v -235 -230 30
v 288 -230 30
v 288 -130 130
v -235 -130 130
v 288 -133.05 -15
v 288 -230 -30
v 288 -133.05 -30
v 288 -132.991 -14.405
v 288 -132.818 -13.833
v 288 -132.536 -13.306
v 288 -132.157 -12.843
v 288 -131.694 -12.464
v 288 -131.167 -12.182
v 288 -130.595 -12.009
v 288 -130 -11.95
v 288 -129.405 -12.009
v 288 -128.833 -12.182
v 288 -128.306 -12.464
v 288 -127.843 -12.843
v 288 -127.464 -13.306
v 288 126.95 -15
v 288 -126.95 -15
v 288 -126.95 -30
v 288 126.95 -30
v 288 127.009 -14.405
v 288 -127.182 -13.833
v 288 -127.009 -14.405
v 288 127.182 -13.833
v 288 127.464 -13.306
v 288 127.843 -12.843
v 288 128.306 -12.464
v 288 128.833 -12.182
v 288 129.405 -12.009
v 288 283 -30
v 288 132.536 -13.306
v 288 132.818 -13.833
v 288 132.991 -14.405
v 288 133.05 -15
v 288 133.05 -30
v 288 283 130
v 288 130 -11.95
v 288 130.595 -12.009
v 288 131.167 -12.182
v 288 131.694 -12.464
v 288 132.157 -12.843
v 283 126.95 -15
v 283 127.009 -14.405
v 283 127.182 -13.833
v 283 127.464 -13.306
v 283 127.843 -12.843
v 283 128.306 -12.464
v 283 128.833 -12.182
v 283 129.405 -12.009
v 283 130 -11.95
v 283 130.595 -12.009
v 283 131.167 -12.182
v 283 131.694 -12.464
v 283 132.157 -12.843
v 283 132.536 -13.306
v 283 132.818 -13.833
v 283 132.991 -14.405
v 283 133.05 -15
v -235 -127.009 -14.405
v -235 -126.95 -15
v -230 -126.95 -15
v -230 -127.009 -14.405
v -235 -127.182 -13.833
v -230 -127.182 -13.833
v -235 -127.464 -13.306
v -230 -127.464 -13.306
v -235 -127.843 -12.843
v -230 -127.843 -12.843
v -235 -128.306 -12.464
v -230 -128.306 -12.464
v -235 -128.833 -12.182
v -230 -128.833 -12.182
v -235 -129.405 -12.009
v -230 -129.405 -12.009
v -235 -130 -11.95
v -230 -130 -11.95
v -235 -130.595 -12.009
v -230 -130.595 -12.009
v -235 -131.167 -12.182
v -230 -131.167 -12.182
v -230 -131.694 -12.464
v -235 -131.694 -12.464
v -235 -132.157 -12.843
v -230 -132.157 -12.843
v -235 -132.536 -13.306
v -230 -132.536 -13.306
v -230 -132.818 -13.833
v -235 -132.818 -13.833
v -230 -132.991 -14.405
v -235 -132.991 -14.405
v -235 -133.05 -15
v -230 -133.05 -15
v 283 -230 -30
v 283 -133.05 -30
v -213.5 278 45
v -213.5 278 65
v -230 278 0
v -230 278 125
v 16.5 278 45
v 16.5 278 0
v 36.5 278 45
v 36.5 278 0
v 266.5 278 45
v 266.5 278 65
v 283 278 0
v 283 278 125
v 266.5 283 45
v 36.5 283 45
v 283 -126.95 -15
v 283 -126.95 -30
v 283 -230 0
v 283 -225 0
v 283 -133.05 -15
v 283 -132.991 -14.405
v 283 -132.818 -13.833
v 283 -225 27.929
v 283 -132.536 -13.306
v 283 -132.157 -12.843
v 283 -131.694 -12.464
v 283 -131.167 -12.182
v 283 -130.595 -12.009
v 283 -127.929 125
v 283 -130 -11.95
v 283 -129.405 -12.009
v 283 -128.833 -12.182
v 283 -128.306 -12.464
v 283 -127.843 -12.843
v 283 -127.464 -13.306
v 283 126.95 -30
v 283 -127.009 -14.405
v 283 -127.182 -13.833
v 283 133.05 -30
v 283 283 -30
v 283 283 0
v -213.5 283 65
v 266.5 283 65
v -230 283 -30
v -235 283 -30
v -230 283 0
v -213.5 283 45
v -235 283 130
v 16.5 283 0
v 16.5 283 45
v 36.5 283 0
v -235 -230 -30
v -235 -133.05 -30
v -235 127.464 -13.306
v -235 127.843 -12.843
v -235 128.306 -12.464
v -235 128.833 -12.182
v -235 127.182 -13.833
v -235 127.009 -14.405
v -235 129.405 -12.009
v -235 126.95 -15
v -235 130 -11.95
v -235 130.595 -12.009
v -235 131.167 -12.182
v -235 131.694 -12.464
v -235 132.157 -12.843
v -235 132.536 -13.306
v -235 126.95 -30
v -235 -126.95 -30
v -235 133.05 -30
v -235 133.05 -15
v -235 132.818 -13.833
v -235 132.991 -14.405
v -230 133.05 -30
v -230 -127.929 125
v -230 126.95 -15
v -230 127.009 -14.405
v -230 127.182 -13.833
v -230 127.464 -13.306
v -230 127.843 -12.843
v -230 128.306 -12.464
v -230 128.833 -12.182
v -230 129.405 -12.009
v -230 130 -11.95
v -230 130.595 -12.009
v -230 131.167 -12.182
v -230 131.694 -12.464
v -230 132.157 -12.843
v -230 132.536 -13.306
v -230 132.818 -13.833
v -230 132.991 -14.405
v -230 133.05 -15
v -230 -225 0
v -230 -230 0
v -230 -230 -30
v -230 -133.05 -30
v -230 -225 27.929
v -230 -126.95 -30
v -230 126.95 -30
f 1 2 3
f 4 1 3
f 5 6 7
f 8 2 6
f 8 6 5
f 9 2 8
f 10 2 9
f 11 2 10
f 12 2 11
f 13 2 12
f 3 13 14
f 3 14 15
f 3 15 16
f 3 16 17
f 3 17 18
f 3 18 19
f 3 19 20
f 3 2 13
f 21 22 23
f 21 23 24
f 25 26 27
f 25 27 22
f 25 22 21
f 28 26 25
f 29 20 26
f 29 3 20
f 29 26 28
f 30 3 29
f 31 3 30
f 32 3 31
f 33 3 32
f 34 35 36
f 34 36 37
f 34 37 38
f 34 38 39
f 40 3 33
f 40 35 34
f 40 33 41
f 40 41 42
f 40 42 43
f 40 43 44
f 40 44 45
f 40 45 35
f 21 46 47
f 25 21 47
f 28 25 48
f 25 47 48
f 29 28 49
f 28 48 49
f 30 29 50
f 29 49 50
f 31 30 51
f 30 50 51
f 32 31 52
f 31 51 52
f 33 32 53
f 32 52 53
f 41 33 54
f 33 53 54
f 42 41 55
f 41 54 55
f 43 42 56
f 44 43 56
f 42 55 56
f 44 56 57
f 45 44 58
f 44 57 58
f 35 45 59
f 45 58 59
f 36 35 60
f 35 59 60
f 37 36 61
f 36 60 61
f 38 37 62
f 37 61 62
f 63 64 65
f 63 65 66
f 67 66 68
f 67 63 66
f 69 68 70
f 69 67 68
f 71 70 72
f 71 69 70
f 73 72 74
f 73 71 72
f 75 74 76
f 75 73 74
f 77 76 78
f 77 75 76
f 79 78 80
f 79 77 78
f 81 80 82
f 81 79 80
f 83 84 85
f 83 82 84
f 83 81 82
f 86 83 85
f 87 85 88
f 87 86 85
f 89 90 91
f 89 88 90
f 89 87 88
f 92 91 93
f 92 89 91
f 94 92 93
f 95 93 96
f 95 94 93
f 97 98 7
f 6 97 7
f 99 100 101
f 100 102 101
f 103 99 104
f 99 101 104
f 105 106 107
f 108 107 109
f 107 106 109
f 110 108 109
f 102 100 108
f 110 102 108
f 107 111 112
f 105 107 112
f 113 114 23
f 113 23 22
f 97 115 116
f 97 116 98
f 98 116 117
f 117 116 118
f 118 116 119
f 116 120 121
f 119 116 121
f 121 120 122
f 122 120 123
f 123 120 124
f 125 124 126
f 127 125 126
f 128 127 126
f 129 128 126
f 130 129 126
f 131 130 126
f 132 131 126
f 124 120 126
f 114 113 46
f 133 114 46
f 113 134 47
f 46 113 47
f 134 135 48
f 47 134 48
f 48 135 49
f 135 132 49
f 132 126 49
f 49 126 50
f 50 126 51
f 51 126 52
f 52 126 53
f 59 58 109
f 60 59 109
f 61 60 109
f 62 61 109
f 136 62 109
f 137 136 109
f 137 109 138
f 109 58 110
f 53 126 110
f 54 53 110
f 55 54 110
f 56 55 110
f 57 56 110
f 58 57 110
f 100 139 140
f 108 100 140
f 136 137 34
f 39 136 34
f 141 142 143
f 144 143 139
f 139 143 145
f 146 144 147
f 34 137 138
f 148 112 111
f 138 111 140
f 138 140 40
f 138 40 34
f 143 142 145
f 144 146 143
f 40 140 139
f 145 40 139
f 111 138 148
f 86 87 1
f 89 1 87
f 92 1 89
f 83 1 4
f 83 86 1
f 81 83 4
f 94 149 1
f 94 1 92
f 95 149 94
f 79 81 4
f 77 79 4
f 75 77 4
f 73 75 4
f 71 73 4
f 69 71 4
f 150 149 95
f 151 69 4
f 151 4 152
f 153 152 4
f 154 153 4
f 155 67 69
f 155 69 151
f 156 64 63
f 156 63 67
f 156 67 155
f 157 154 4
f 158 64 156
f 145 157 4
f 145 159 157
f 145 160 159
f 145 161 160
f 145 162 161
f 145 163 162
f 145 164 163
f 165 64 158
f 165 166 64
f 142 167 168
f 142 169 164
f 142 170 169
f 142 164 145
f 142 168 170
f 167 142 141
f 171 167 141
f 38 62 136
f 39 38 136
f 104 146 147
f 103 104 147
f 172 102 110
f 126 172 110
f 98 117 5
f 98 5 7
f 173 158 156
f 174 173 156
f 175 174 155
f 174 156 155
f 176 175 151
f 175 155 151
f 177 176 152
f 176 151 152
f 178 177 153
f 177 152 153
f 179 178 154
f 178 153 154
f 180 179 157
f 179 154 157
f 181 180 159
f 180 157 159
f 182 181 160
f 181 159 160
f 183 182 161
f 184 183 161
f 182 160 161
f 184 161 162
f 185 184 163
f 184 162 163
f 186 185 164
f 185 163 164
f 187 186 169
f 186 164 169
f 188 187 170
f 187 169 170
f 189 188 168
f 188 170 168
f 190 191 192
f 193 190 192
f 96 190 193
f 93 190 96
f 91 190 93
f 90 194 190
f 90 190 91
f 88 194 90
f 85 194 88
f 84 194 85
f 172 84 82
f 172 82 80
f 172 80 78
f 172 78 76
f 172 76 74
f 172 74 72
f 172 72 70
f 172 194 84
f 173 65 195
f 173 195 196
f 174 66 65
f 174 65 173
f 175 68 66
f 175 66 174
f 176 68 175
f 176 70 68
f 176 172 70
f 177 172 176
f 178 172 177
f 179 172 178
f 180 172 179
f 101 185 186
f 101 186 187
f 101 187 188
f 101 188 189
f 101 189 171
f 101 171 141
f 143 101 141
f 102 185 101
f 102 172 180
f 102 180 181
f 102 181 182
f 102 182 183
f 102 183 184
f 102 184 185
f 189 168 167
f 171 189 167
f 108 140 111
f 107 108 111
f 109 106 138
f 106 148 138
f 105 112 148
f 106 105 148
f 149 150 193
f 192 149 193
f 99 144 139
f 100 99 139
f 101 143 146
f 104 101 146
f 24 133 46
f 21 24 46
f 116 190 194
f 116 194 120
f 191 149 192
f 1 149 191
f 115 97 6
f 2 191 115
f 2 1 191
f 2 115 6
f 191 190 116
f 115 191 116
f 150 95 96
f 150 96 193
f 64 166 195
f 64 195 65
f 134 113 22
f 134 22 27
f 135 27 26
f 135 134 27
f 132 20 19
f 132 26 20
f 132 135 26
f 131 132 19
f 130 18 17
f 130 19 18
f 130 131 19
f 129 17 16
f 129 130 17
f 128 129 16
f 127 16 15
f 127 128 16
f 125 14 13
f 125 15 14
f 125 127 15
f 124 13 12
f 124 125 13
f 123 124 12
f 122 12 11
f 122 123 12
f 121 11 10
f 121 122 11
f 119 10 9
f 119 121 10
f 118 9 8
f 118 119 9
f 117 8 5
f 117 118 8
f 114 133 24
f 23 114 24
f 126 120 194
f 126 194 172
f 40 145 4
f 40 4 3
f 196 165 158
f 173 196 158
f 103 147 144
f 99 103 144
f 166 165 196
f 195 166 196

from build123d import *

# Parameters (mm, degrees)
SCHIZZO2_W                   = 523
SCHIZZO2_H                   = 513
ESTRUSIONE_ESTRUSIONE2_DEPTH = 130
SVUOTA1_T                    = -5
TAGLIO_ESTRUSIONE2_REACH     = 610.702
ESTRUSIONE_ESTRUSIONE3_DEPTH = 523
TAGLIO_ESTRUSIONE3_DEPTH     = 10
SCHIZZO5_W                   = 5
SCHIZZO5_H                   = 513
ESTRUSIONE_ESTRUSIONE5_DEPTH = 30
TAGLIO_ESTRUSIONE4_REACH     = 610.702


with BuildPart() as part:
    # Schizzo2 → Estrusione-Estrusione2 (new body)
    with BuildSketch(Plane.XY):
        with Locations((26.5, 26.5)):
            Rectangle(SCHIZZO2_W, SCHIZZO2_H)
    extrude(amount=ESTRUSIONE_ESTRUSIONE2_DEPTH)

    # Svuota1
    svuota1_openings = [part.faces().sort_by_distance(p)[0] for p in [
        (26.5, 26.5, 0),
    ]]
    offset(amount=SVUOTA1_T, openings=svuota1_openings, kind=Kind.INTERSECTION)

    # Taglio-Estrusione2: up to this face of the body (flat: up to its plane)
    taglio_estrusione2_end = Plane(part.part.faces().sort_by_distance((-235, 26.5, 65))[0])
    # Schizzo3 → Taglio-Estrusione2 (cut, up to the picked face)
    with BuildSketch(Plane(origin=(288, 0, 0), x_dir=(0, 0, -1), z_dir=(1, 0, 0)), mode=Mode.PRIVATE) as taglio_estrusione2_sk1:
        Polygon((-30, -230), (-130, -130), (-130, -230), align=None)
    taglio_estrusione2_tool1 = split(extrude(taglio_estrusione2_sk1.sketch, amount=-TAGLIO_ESTRUSIONE2_REACH, mode=Mode.PRIVATE), bisect_by=taglio_estrusione2_end, keep=Keep.BOTH, mode=Mode.PRIVATE)
    add(taglio_estrusione2_tool1.solids().sort_by(Axis((288, -196.666667, 96.666667), (-1, 0, 0)))[0], mode=Mode.SUBTRACT)

    # Schizzo3<4> → Estrusione-Estrusione3 (add)
    with BuildSketch(Plane(origin=(288, 0, 0), x_dir=(0, 0, -1), z_dir=(1, 0, 0))):
        Polygon((-130, -122.928932188), (-130, -130), (-30, -230), (-22.928932188, -230), align=None)
    extrude(amount=-ESTRUSIONE_ESTRUSIONE3_DEPTH)

    # Schizzo4 → Taglio-Estrusione3 (cut)
    with BuildSketch(Plane(origin=(0, 283, 0), x_dir=(1, 0, 0), z_dir=(0, 1, 0))):
        Polygon((-213.5, -65), (266.5, -65), (266.5, -45), (36.5, -45), (36.5, 0), (16.5, 0), (16.5, -45), (-213.5, -45), align=None)
    extrude(amount=-TAGLIO_ESTRUSIONE3_DEPTH, mode=Mode.SUBTRACT)

    # Schizzo5 → Estrusione-Estrusione5 (add)
    with BuildSketch(Plane.XY):
        with Locations((285.5, 26.5)):
            Rectangle(SCHIZZO5_W, SCHIZZO5_H)
        with Locations((-232.5, 26.5)):
            Rectangle(SCHIZZO5_W, SCHIZZO5_H)
    extrude(amount=-ESTRUSIONE_ESTRUSIONE5_DEPTH)

    # Taglio-Estrusione4: up to this face of the body (flat: up to its plane)
    taglio_estrusione4_end = Plane(part.part.faces().sort_by_distance((288, 40.976301678, 46.972842069))[0])
    # Schizzo6 → Taglio-Estrusione4 (cut, up to the picked face)
    with BuildSketch(Plane.ZY.offset(235), mode=Mode.PRIVATE) as taglio_estrusione4_sk1:
        with BuildLine():
            Line((-15, 133.05), (-30, 133.05))
            Line((-30, 133.05), (-30, 126.95))
            Line((-30, 126.95), (-15, 126.95))
            ThreePointArc((-15, 126.95), (-11.95, 130), (-15, 133.05))
        make_face()
    taglio_estrusione4_tool1 = split(extrude(taglio_estrusione4_sk1.sketch, amount=-TAGLIO_ESTRUSIONE4_REACH, mode=Mode.PRIVATE), bisect_by=taglio_estrusione4_end, keep=Keep.BOTH, mode=Mode.PRIVATE)
    # Schizzo6 → Taglio-Estrusione4 (cut, up to the picked face)
    with BuildSketch(Plane.ZY.offset(235), mode=Mode.PRIVATE) as taglio_estrusione4_sk2:
        with BuildLine():
            Line((-30, -133.05), (-30, -126.95))
            Line((-30, -126.95), (-15, -126.95))
            ThreePointArc((-15, -126.95), (-11.95, -130), (-15, -133.05))
            Line((-15, -133.05), (-30, -133.05))
        make_face()
    taglio_estrusione4_tool2 = split(extrude(taglio_estrusione4_sk2.sketch, amount=-TAGLIO_ESTRUSIONE4_REACH, mode=Mode.PRIVATE), bisect_by=taglio_estrusione4_end, keep=Keep.BOTH, mode=Mode.PRIVATE)
    add(taglio_estrusione4_tool1.solids().sort_by(Axis((-235, 130, -21.288948), (1, 0, 0)))[0], mode=Mode.SUBTRACT)
    add(taglio_estrusione4_tool2.solids().sort_by(Axis((-235, -130, -21.288948), (1, 0, 0)))[0], mode=Mode.SUBTRACT)


solid = part.part
